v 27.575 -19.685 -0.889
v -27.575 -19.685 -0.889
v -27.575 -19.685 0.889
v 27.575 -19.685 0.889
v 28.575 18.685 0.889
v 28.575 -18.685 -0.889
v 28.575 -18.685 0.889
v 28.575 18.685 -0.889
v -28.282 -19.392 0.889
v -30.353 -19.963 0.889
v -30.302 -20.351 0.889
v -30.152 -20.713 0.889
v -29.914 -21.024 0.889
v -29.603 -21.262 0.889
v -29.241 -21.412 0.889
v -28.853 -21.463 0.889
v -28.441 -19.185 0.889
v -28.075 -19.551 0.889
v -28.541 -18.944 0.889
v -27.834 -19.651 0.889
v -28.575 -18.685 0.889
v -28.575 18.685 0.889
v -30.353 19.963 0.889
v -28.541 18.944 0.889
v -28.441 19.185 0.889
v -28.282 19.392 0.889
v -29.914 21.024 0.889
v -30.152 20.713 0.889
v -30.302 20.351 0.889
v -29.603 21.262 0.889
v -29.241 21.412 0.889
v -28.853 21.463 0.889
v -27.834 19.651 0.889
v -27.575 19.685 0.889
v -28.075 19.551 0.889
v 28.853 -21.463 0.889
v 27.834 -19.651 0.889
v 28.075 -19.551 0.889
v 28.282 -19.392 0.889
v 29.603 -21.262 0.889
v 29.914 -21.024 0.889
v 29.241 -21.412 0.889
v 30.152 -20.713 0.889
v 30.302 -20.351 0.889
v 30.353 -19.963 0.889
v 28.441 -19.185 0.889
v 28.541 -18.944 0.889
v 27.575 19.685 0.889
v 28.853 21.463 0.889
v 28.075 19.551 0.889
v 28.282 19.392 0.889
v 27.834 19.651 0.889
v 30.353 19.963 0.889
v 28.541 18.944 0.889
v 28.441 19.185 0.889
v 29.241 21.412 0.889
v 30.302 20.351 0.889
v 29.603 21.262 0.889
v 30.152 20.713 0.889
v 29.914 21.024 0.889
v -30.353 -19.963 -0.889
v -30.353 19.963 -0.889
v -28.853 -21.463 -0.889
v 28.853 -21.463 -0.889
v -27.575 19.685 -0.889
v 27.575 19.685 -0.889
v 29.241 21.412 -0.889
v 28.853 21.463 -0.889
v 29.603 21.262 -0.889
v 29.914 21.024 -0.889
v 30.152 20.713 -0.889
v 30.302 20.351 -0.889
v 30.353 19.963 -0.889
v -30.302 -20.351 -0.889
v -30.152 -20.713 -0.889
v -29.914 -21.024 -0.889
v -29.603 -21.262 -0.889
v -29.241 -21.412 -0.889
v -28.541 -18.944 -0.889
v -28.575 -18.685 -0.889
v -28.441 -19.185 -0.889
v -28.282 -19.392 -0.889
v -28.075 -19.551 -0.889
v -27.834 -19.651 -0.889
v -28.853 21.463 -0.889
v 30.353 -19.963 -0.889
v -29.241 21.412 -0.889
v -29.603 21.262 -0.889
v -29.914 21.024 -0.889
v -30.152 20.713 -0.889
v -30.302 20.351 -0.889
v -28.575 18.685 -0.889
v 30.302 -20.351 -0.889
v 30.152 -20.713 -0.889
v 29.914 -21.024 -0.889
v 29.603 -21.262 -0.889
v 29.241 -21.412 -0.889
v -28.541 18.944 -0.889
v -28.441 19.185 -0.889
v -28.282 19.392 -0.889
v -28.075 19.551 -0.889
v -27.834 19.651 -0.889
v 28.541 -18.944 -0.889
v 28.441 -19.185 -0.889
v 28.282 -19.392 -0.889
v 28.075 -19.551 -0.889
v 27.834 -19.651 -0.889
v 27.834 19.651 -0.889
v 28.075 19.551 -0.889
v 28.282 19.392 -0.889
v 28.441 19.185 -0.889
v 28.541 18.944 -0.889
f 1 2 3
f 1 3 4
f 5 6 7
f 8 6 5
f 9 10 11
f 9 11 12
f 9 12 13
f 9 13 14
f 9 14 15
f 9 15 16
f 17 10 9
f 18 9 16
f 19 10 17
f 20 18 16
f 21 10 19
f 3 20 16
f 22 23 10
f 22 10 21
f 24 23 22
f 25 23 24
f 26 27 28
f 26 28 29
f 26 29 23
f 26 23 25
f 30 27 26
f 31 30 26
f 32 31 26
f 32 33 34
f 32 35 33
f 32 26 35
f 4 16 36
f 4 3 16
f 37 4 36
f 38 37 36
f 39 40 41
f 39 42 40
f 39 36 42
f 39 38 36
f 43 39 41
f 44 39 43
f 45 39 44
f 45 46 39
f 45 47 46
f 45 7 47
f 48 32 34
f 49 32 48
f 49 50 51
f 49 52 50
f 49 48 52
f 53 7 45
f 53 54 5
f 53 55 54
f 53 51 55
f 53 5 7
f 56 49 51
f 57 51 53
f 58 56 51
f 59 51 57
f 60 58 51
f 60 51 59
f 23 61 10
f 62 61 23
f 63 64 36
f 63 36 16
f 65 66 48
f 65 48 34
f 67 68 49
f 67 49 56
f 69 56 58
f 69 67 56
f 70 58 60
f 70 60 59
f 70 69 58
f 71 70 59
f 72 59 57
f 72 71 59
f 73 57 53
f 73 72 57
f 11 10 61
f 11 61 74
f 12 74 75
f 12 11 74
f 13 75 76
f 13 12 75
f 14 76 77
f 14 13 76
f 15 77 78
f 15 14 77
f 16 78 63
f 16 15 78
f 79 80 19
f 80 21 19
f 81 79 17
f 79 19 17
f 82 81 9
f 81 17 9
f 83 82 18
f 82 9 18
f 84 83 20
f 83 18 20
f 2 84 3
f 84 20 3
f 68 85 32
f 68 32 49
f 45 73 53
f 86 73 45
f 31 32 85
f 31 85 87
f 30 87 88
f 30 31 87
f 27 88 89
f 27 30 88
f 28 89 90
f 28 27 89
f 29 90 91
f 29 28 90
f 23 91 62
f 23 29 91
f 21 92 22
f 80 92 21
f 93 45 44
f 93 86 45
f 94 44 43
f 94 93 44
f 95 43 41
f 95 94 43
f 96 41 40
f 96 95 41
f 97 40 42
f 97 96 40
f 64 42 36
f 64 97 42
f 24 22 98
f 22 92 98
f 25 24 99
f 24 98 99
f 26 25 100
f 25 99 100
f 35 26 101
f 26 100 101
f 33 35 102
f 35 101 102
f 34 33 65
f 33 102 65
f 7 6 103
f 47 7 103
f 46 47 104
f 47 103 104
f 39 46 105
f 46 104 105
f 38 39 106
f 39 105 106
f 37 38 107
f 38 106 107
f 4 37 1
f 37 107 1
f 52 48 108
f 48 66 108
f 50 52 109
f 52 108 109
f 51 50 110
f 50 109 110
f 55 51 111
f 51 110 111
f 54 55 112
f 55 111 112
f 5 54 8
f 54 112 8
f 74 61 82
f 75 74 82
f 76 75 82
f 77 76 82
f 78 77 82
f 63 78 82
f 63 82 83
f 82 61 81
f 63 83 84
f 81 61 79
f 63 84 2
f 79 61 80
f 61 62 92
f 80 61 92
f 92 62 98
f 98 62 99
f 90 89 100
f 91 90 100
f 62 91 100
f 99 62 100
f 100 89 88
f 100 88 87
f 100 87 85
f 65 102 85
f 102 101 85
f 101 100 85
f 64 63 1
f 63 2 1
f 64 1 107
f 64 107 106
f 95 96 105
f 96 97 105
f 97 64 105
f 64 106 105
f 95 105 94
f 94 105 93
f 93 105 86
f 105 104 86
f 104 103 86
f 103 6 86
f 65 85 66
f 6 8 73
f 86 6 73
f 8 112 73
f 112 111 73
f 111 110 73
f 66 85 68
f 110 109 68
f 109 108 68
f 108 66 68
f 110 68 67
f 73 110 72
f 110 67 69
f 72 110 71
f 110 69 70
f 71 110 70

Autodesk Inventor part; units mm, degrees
ref_plane "YZ Plane" through (0, 0, 0) normal (1, 0, 0) x (0, 1, 0)
ref_plane "XZ Plane" through (0, 0, 0) normal (0, 1, 0) x (-1, 0, 0)
ref_plane "XY Plane" through (0, 0, 0) normal (0, 0, 1) x (1, 0, 0)
sketch "Sketch1" plane through (0, 0, 0) normal (0, 0, 1) x (1, 0, 0)
  line L0 (-28.575, -19.685) -> (28.575, -19.685)
  line L1 (28.575, -19.685) -> (28.575, 19.685)
  line L2 (28.575, 19.685) -> (-28.575, 19.685)
  line L3 (-28.575, 19.685) -> (-28.575, -19.685)
  line L4 (-28.575, -19.685) -> (28.575, 19.685) construction
  line L5 (28.575, -19.685) -> (-28.575, 19.685) construction
  line L6 (-30.353, 21.463) -> (30.353, 21.463)
  line L7 (30.353, 21.463) -> (30.353, -21.463)
  line L8 (30.353, -21.463) -> (-30.353, -21.463)
  line L9 (-30.353, -21.463) -> (-30.353, 21.463)
  point P0 (0, 0)
  dimension "d0" = 57.15
  dimension "d1" = 39.37
  dimension "d2" = 1.778
extrude "Extrusion1" add sketch "Sketch1" along normal mid plane 1.778
fillet "Fillet1" radius 1 4 edges at (-28.575, -19.685, 0) (-28.575, 19.685, 0) (28.575, 19.685, 0) (28.575, -19.685, 0)
fillet "Fillet1" radius 1.5 4 edges at (-30.353, 21.463, 0) (-30.353, -21.463, 0) (30.353, -21.463, 0) (30.353, 21.463, 0)
properties part number "O-RING DASH 036 SQUARE"
